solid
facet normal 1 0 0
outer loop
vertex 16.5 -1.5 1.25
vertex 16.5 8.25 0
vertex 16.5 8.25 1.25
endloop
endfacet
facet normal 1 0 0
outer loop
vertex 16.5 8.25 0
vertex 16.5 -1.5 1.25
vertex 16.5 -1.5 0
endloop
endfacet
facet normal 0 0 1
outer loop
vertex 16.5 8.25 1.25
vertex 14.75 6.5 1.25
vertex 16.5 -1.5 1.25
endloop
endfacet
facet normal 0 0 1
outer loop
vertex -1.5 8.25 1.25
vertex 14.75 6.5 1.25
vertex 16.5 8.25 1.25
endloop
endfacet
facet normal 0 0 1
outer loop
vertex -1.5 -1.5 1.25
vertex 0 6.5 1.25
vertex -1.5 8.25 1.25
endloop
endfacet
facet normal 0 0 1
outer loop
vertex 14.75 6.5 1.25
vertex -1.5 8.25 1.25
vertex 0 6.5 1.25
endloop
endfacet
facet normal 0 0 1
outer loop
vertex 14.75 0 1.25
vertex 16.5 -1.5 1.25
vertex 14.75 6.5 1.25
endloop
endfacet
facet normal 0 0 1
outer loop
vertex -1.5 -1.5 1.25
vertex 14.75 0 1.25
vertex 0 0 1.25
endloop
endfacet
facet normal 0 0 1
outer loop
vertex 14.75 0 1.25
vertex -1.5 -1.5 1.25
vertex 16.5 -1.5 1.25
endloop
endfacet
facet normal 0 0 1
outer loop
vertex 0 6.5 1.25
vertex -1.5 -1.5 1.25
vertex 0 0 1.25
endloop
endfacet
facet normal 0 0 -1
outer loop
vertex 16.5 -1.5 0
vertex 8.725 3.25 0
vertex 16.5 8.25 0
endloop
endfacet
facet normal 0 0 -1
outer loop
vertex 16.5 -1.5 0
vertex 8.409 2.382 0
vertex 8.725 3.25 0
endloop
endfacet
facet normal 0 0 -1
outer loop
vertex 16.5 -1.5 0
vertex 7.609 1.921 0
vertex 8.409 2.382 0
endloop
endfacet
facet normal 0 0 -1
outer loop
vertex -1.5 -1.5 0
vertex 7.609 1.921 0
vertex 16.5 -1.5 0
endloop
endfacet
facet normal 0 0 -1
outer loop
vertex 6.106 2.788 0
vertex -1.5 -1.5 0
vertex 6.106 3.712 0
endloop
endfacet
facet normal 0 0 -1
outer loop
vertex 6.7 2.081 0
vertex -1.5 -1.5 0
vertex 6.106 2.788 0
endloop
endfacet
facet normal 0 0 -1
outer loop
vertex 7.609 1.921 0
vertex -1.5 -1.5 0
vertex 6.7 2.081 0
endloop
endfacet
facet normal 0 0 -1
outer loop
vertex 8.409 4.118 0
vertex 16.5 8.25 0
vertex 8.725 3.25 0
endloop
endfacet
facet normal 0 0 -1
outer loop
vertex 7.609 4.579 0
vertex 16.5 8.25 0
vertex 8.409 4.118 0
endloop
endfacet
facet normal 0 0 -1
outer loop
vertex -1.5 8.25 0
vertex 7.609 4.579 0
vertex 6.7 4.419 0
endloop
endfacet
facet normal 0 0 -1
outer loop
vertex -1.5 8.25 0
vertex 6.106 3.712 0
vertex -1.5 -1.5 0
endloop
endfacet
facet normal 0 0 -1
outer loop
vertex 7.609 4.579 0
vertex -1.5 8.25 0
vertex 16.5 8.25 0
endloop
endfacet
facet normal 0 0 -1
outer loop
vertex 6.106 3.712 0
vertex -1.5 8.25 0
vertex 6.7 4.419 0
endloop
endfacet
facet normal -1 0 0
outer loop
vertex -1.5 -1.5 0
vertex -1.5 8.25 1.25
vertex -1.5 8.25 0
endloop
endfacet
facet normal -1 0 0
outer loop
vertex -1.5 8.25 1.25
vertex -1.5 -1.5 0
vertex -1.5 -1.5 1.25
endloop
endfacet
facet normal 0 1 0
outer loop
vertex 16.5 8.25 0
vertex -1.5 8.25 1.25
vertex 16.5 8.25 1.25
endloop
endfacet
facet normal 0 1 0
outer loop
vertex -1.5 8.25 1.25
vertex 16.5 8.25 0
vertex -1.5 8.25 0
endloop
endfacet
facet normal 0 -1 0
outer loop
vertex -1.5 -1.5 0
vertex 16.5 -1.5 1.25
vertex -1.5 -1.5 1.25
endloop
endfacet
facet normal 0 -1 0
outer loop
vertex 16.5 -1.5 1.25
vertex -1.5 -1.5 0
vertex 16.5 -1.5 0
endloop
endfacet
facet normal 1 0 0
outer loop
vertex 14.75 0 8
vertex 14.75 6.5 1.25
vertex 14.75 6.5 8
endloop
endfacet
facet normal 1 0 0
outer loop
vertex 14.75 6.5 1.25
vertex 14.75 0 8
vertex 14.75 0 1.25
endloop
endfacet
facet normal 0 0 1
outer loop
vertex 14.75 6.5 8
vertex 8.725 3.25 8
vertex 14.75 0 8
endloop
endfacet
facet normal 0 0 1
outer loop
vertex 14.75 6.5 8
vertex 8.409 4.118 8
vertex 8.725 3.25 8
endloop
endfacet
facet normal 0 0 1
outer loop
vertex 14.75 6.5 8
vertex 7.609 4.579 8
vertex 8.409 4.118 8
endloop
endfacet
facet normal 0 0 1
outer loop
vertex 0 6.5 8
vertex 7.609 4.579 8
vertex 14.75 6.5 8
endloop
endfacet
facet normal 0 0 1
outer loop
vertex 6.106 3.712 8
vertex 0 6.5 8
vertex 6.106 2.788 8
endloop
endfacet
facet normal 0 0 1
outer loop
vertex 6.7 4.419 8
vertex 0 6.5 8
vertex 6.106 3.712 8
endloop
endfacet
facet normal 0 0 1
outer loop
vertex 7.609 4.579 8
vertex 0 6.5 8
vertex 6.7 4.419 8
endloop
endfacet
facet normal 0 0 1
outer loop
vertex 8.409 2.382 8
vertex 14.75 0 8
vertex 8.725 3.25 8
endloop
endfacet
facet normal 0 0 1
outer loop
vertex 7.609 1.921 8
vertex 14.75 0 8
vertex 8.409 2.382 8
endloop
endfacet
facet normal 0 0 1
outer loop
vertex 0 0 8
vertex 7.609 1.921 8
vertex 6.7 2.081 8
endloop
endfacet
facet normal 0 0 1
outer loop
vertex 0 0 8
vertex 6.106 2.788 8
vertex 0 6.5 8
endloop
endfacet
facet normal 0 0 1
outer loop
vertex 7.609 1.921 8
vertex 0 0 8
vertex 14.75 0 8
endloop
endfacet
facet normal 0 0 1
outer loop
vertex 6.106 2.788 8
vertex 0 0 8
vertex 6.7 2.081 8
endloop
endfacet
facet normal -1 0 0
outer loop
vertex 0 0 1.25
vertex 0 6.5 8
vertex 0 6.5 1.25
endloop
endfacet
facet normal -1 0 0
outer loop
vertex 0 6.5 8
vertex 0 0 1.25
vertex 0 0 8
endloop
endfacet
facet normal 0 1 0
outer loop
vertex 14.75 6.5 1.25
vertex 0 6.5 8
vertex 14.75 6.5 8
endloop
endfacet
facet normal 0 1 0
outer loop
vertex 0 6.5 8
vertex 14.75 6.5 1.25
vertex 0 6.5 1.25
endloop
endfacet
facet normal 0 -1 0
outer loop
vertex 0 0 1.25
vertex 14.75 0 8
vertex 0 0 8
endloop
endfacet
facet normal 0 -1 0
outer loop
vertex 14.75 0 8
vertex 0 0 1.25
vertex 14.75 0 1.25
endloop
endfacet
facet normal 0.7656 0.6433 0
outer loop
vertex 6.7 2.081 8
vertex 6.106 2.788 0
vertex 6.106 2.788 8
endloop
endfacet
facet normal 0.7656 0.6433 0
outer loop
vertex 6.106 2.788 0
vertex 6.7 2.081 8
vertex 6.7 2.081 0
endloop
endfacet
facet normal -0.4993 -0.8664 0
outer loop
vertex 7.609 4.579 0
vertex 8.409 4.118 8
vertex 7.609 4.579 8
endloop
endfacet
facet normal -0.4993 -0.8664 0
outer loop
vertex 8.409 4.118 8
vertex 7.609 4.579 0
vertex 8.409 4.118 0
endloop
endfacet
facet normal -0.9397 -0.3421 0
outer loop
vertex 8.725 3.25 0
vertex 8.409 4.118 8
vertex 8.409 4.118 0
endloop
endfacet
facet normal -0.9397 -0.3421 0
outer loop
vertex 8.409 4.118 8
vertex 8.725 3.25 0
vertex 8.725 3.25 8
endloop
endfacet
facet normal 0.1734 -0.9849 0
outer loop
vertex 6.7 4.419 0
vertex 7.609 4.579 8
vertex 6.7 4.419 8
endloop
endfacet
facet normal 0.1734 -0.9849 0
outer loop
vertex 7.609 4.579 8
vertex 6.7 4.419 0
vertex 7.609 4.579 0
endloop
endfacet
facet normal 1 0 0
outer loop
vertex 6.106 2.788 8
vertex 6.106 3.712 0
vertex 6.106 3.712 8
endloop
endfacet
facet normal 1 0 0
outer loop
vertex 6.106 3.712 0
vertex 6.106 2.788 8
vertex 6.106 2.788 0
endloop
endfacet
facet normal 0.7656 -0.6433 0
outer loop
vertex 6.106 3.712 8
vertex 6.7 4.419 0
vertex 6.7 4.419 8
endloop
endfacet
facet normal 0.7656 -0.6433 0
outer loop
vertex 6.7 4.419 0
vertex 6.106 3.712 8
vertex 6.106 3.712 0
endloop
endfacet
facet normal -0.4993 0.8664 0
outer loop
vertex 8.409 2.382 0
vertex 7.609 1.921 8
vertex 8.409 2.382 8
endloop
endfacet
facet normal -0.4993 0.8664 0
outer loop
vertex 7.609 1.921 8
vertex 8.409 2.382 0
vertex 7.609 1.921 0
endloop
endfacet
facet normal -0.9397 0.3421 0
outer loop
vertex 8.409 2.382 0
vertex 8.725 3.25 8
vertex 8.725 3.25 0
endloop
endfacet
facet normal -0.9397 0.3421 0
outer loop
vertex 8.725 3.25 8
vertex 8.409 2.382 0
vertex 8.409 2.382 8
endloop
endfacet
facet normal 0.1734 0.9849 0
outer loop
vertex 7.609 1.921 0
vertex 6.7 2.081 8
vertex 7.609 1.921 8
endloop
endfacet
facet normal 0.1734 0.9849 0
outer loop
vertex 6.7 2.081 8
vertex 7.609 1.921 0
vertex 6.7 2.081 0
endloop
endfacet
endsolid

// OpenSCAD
tolerance = .25;
input_holesize = [15,6.75,7];
flangewidth = 3;
flangeheight = 1.25;
holesize = [input_holesize[0]-tolerance,input_holesize[1]-tolerance,input_holesize[2]];
tolerance = .25;
flange = [input_holesize[0]+flangewidth, input_holesize[1]+flangewidth, flangeheight];
filamentdiameter = 2.2;

difference(){
	union(){
		translate([-flangewidth/2,-flangewidth/2,0])cube(flange);
		translate([0,0,flangeheight-tolerance])cube(holesize);
	}
	translate([holesize[0]/2, holesize[1]/2, 0])cylinder(r=filamentdiameter/2+tolerance, h=holesize[2]+flangeheight*3, $fa=1, $fs=1);
}
